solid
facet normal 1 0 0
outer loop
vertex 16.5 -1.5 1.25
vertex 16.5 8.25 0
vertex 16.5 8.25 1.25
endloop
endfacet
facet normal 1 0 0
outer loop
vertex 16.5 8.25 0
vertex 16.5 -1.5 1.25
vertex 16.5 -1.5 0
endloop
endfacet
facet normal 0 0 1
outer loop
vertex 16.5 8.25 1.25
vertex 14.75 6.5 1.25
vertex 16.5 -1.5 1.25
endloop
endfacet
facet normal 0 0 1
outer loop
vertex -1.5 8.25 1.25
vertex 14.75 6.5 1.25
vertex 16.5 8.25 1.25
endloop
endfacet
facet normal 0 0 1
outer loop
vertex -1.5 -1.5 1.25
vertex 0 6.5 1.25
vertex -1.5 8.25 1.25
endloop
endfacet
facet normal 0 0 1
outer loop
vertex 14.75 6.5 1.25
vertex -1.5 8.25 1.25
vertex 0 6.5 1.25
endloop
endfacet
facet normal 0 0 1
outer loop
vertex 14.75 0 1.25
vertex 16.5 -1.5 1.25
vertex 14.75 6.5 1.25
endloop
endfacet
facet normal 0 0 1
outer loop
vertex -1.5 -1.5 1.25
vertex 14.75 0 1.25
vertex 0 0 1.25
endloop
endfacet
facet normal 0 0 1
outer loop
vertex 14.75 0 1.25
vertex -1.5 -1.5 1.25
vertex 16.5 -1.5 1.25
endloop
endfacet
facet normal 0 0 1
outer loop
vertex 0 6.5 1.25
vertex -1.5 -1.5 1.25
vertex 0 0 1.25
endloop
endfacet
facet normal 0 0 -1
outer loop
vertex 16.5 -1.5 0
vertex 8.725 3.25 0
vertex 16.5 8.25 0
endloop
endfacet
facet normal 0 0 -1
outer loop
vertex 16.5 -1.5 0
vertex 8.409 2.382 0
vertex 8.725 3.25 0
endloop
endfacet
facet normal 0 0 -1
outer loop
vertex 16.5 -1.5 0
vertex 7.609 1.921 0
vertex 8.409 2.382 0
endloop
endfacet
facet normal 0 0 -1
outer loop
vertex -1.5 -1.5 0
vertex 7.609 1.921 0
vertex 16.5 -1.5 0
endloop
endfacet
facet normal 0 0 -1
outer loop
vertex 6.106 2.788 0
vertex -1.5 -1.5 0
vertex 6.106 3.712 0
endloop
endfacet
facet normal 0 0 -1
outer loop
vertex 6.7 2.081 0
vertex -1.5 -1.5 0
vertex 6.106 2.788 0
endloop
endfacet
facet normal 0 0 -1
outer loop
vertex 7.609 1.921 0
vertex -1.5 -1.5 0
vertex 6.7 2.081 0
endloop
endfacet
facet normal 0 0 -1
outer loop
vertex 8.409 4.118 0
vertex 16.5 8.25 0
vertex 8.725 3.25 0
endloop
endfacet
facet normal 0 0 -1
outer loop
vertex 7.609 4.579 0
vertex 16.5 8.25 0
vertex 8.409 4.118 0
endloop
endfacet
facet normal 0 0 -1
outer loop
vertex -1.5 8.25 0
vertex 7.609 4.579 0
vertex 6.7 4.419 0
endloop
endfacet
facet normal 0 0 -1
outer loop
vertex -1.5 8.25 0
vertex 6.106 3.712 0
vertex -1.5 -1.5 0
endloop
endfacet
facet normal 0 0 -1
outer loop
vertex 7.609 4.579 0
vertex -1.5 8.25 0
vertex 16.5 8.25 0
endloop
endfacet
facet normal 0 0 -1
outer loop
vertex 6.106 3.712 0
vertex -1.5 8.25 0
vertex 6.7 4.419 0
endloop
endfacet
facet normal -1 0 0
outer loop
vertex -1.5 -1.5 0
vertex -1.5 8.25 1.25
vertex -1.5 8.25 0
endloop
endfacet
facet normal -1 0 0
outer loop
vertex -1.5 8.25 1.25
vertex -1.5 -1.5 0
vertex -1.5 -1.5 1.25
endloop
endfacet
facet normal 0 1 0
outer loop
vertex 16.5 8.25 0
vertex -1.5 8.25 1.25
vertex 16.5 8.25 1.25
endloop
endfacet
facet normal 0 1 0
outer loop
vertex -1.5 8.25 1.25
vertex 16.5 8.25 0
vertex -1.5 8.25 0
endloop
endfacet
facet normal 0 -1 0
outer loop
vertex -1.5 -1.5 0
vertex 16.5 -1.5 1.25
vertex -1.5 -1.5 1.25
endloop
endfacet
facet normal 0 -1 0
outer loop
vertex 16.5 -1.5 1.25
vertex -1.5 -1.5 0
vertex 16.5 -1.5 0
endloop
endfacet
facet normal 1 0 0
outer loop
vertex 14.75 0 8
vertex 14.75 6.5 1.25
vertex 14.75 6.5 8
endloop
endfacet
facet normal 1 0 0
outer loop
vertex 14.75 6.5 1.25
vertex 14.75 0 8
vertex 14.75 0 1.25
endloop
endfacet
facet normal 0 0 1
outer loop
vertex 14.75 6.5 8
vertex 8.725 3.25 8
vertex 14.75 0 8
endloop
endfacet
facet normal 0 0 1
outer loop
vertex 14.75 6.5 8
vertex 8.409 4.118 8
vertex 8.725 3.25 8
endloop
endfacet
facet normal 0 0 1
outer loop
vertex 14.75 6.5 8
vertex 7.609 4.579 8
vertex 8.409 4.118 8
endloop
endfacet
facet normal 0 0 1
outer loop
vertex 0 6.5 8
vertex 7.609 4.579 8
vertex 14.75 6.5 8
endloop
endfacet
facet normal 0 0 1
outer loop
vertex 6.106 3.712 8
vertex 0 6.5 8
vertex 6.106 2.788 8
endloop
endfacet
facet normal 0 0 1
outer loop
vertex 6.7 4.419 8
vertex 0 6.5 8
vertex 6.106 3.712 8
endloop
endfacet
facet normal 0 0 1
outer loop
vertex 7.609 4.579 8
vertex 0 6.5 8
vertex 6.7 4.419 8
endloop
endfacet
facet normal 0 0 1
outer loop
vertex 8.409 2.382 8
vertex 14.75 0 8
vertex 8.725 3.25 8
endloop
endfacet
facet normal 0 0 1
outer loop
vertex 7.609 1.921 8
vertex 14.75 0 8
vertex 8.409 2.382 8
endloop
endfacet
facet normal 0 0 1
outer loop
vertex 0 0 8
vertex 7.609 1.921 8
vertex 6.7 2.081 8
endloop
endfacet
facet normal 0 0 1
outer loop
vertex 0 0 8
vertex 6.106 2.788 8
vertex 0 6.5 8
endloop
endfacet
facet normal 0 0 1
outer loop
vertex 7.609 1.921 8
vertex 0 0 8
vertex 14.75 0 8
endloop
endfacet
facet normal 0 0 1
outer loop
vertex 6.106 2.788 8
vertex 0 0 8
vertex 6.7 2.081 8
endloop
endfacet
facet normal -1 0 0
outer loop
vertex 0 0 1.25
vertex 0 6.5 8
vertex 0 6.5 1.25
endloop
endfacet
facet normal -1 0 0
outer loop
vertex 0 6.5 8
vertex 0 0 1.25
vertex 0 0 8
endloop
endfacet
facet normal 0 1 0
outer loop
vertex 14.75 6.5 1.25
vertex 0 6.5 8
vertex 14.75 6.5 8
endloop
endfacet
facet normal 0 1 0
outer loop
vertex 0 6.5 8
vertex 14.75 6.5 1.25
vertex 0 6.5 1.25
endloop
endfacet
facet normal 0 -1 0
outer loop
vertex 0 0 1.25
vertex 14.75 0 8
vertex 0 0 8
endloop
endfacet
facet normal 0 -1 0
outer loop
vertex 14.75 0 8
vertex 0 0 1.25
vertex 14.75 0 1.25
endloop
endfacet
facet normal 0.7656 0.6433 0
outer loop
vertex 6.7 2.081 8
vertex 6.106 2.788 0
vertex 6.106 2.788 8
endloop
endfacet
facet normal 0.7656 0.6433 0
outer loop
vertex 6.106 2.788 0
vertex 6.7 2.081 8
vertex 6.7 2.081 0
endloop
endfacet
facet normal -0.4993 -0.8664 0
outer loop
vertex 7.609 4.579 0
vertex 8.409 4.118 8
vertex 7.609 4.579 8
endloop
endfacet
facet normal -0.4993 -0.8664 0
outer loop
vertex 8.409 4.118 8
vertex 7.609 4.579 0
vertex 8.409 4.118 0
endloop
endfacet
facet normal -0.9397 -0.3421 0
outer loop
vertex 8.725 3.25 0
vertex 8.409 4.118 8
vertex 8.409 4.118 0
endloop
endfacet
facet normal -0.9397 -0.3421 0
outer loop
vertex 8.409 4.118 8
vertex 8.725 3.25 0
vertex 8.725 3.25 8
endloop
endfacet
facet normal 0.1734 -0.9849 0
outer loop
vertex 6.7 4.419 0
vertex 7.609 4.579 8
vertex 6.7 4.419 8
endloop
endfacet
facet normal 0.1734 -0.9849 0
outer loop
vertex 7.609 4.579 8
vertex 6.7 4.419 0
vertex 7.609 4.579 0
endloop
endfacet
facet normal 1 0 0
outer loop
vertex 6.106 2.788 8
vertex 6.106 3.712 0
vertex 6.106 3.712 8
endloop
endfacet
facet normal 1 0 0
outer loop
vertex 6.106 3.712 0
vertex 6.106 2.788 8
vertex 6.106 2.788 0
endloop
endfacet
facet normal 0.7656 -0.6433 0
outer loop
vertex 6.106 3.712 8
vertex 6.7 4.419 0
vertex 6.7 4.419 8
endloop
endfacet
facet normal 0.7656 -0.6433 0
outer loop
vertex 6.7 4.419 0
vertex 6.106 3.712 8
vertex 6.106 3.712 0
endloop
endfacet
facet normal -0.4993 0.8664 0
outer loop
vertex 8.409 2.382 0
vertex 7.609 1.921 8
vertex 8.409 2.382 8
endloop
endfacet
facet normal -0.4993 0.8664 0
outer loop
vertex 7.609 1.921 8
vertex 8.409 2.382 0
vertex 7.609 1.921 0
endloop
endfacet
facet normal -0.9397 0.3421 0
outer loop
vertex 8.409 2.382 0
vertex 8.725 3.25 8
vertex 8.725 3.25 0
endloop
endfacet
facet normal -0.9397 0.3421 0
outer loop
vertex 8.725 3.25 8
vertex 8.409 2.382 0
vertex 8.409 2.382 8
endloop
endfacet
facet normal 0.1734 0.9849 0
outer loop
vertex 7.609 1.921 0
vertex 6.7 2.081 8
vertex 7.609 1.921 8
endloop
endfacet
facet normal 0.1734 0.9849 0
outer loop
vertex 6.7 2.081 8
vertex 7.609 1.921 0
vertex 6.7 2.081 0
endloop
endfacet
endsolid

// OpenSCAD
tolerance = .25;
input_holesize = [15,6.75,7];
flangewidth = 3;
flangeheight = 1.25;
holesize = [input_holesize[0]-tolerance,input_holesize[1]-tolerance,input_holesize[2]];
tolerance = .25;
flange = [input_holesize[0]+flangewidth, input_holesize[1]+flangewidth, flangeheight];
filamentdiameter = 2.2;

difference(){
	union(){
		translate([-flangewidth/2,-flangewidth/2,0])cube(flange);
		translate([0,0,flangeheight-tolerance])cube(holesize);
	}
	translate([holesize[0]/2, holesize[1]/2, 0])cylinder(r=filamentdiameter/2+tolerance, h=holesize[2]+flangeheight*3, $fa=1, $fs=1);
}
